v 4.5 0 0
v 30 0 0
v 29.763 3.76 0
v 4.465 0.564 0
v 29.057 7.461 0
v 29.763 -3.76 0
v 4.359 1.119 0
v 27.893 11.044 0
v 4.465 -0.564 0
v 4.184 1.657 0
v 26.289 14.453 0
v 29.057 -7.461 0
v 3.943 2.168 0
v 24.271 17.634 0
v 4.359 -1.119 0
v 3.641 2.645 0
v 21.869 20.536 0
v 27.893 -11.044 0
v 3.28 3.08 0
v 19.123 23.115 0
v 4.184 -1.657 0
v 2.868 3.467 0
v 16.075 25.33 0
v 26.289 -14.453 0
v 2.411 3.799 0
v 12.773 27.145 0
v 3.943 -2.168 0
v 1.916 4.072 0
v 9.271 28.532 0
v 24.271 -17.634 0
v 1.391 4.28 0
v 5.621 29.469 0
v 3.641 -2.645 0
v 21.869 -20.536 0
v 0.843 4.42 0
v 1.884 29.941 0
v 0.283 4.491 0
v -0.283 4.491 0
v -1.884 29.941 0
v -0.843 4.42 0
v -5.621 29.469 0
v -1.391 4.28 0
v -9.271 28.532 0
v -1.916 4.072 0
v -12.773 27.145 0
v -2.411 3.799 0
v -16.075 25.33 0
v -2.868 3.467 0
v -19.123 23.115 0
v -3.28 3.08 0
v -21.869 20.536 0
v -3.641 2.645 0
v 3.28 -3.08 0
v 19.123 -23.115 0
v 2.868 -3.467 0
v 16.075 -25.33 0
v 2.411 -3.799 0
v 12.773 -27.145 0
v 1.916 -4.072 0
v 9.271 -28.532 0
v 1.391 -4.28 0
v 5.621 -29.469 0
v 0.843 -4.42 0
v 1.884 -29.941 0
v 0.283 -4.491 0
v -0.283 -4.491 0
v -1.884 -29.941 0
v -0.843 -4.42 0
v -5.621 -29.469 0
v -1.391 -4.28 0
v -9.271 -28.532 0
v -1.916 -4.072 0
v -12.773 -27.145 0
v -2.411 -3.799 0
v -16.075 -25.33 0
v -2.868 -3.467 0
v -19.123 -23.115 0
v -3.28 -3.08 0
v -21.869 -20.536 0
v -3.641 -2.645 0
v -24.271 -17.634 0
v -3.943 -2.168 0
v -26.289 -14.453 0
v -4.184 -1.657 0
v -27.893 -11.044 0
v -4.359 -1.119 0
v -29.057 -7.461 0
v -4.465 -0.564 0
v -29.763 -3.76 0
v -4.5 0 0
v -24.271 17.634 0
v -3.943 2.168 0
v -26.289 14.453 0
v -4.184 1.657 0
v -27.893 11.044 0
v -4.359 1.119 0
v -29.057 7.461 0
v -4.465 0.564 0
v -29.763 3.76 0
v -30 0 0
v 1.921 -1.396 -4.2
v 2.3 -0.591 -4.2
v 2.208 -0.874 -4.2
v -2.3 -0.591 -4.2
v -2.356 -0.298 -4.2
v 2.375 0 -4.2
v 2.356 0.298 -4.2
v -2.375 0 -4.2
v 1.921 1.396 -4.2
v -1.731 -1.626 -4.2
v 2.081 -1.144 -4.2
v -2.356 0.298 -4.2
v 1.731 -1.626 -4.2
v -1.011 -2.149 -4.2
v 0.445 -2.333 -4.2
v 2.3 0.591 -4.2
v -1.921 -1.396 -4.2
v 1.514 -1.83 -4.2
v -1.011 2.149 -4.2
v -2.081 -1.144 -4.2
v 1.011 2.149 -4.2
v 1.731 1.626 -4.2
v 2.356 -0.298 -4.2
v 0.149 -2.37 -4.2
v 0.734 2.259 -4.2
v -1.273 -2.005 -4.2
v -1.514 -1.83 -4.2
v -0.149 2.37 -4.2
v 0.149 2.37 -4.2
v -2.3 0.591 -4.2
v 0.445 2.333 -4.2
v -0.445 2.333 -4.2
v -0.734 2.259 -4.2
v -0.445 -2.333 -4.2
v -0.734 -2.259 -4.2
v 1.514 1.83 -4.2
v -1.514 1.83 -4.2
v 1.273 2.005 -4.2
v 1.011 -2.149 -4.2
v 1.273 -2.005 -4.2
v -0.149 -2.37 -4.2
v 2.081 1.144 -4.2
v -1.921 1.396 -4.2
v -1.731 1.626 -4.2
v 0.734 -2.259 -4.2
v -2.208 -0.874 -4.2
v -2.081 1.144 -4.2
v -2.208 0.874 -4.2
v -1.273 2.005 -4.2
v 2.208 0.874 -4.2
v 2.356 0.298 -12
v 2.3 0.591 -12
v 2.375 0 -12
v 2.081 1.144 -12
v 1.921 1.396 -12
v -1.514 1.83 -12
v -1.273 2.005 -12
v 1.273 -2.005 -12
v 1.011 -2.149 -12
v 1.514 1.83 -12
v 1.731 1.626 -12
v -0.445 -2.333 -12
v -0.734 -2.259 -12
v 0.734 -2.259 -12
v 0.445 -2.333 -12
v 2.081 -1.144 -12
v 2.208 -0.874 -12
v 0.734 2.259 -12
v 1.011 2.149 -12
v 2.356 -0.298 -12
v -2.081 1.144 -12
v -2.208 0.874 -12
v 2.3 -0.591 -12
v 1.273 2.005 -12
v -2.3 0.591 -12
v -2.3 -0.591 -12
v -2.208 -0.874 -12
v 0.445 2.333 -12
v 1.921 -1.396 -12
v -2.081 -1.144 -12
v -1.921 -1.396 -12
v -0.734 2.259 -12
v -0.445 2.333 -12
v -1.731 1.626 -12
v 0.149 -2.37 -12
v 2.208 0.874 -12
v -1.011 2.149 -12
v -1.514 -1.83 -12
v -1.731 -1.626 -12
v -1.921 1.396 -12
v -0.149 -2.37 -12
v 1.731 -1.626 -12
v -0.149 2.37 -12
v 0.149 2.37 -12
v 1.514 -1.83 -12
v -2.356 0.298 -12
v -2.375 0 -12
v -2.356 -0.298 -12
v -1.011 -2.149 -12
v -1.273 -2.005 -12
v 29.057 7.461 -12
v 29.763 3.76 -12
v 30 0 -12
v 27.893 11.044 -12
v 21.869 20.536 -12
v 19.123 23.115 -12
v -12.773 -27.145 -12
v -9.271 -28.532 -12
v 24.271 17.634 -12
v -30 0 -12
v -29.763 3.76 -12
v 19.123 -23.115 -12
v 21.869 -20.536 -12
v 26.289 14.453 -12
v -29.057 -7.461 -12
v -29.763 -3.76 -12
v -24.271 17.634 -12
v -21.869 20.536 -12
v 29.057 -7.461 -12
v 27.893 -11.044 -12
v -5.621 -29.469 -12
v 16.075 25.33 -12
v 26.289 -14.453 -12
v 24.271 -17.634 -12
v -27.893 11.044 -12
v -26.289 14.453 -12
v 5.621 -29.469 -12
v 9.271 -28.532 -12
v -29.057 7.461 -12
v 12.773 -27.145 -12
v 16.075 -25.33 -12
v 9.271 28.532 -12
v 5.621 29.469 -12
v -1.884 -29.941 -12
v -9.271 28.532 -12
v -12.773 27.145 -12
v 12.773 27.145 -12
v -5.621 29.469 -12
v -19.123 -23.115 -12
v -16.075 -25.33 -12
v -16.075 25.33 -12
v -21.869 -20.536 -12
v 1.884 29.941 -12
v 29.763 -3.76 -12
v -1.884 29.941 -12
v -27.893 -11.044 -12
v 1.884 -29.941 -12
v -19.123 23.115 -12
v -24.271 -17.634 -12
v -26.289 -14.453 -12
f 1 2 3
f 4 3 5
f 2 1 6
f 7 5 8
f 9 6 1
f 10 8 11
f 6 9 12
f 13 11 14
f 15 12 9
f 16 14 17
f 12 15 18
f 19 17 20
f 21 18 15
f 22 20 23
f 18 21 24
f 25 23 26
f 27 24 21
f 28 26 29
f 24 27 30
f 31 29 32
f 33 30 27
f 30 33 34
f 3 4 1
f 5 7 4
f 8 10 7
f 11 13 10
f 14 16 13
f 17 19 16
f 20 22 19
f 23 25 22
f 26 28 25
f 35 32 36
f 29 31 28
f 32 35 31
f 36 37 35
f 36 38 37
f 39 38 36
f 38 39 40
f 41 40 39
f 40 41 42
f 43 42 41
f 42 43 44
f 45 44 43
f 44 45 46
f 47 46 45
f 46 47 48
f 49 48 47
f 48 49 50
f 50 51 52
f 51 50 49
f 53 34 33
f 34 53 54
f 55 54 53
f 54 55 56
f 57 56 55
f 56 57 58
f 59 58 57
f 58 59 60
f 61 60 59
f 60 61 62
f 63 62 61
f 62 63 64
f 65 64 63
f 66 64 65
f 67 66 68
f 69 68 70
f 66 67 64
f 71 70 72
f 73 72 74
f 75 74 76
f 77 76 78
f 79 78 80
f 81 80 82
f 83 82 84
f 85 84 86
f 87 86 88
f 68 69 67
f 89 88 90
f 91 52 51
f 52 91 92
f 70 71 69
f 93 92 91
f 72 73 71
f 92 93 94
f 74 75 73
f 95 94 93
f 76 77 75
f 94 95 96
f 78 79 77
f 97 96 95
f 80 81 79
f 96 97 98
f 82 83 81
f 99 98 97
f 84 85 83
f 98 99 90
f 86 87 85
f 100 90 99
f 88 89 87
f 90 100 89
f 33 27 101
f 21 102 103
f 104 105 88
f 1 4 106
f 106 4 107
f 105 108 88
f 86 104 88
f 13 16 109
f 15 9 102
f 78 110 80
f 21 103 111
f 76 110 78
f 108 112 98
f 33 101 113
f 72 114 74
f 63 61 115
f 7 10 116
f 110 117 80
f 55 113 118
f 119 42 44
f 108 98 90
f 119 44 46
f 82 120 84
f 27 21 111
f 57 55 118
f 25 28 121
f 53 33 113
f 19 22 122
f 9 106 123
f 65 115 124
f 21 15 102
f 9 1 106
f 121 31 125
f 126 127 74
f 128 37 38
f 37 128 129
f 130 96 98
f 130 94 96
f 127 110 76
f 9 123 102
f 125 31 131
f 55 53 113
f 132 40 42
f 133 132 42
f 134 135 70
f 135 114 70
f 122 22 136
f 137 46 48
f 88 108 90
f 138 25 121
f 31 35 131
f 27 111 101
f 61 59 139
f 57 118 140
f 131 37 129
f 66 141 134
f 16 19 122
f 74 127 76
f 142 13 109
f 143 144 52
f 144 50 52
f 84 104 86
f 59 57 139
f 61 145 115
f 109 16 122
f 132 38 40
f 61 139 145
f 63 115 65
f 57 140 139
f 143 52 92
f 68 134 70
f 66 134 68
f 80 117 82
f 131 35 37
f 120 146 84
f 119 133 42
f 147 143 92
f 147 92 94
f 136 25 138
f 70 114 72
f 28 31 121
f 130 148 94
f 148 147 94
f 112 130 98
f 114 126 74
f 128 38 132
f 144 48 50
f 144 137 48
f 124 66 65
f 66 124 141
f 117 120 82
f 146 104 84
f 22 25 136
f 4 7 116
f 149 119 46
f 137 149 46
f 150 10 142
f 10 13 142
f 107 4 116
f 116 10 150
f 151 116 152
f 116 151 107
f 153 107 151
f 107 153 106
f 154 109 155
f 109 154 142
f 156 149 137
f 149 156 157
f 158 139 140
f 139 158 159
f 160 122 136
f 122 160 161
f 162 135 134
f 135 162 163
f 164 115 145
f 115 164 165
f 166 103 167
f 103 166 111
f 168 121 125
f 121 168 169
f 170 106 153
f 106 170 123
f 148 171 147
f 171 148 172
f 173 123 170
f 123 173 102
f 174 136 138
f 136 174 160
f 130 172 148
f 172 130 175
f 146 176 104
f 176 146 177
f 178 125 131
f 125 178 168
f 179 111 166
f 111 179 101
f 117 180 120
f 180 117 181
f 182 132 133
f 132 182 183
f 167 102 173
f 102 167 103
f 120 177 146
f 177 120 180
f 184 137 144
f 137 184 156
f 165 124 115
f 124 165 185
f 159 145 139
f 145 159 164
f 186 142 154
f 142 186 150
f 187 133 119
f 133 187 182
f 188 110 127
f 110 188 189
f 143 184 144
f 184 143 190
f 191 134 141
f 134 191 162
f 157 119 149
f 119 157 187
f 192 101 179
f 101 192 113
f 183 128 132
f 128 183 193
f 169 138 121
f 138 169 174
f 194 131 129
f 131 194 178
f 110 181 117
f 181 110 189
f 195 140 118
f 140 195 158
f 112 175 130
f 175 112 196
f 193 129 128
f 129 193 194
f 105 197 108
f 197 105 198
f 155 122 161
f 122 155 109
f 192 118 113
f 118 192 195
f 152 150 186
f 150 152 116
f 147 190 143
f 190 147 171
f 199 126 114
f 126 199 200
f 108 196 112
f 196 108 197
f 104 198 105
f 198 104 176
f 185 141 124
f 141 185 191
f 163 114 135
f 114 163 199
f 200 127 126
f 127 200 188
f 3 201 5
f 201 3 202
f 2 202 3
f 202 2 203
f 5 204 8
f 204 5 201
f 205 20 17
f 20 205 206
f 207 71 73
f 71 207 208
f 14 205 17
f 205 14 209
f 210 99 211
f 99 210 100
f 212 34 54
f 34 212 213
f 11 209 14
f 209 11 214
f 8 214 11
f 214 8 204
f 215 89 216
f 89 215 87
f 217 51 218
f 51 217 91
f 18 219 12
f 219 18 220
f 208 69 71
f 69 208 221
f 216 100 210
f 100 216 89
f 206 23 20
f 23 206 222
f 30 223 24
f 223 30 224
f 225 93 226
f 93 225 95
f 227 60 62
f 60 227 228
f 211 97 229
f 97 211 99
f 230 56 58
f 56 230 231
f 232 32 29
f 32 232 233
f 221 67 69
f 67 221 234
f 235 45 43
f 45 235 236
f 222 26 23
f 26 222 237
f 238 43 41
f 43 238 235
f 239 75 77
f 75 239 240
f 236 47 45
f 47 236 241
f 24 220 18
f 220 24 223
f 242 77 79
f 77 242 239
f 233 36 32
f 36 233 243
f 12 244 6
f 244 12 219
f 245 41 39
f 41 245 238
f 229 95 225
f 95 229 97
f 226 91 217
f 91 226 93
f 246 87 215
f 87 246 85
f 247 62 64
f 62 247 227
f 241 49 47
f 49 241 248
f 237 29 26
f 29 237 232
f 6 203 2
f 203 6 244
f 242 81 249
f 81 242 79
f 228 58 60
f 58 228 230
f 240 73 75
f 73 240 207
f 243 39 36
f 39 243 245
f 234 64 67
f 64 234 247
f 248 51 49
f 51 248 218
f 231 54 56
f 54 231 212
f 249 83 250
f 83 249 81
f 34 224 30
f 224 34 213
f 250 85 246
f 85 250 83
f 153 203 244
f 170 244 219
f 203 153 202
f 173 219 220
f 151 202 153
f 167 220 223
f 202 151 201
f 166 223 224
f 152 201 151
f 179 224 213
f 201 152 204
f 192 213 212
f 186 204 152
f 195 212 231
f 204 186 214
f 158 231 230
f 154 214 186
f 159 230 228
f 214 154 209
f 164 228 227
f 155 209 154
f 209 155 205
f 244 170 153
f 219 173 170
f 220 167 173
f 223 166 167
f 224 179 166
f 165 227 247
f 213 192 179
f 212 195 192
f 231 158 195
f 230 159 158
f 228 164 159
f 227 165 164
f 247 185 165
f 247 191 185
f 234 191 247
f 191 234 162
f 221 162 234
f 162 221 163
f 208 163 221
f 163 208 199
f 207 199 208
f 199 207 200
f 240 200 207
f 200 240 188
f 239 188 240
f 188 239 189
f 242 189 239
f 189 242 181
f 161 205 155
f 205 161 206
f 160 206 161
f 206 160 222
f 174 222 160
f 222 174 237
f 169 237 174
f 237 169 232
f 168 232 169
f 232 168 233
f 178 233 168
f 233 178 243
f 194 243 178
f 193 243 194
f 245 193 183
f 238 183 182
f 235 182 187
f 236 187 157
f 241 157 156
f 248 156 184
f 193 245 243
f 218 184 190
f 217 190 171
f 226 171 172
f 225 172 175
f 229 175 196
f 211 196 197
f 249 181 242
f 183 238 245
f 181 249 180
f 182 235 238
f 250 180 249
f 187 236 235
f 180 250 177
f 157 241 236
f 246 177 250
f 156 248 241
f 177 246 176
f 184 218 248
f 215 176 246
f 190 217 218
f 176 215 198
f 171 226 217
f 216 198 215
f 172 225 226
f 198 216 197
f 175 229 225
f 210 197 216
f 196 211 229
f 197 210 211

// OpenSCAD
$fn = 50;


difference() {
	union() {
		translate(v = [0, 0, -12.0000000000]) {
			cylinder(h = 12, r = 30.0000000000);
		}
	}
	union() {
		translate(v = [0, 0, 0]) {
			rotate(a = [0, 0, 0]) {
				difference() {
					union() {
						translate(v = [0, 0, -15.0000000000]) {
							cylinder(h = 15, r = 2.2500000000);
						}
						translate(v = [0, 0, -4.2000000000]) {
							cylinder(h = 4.2000000000, r1 = 2.3750000000, r2 = 4.5000000000);
						}
						translate(v = [0, 0, -15.0000000000]) {
							cylinder(h = 15, r = 2.3750000000);
						}
						translate(v = [0, 0, -15.0000000000]) {
							cylinder(h = 15, r = 2.2500000000);
						}
					}
					union();
				}
			}
		}
	}
}
